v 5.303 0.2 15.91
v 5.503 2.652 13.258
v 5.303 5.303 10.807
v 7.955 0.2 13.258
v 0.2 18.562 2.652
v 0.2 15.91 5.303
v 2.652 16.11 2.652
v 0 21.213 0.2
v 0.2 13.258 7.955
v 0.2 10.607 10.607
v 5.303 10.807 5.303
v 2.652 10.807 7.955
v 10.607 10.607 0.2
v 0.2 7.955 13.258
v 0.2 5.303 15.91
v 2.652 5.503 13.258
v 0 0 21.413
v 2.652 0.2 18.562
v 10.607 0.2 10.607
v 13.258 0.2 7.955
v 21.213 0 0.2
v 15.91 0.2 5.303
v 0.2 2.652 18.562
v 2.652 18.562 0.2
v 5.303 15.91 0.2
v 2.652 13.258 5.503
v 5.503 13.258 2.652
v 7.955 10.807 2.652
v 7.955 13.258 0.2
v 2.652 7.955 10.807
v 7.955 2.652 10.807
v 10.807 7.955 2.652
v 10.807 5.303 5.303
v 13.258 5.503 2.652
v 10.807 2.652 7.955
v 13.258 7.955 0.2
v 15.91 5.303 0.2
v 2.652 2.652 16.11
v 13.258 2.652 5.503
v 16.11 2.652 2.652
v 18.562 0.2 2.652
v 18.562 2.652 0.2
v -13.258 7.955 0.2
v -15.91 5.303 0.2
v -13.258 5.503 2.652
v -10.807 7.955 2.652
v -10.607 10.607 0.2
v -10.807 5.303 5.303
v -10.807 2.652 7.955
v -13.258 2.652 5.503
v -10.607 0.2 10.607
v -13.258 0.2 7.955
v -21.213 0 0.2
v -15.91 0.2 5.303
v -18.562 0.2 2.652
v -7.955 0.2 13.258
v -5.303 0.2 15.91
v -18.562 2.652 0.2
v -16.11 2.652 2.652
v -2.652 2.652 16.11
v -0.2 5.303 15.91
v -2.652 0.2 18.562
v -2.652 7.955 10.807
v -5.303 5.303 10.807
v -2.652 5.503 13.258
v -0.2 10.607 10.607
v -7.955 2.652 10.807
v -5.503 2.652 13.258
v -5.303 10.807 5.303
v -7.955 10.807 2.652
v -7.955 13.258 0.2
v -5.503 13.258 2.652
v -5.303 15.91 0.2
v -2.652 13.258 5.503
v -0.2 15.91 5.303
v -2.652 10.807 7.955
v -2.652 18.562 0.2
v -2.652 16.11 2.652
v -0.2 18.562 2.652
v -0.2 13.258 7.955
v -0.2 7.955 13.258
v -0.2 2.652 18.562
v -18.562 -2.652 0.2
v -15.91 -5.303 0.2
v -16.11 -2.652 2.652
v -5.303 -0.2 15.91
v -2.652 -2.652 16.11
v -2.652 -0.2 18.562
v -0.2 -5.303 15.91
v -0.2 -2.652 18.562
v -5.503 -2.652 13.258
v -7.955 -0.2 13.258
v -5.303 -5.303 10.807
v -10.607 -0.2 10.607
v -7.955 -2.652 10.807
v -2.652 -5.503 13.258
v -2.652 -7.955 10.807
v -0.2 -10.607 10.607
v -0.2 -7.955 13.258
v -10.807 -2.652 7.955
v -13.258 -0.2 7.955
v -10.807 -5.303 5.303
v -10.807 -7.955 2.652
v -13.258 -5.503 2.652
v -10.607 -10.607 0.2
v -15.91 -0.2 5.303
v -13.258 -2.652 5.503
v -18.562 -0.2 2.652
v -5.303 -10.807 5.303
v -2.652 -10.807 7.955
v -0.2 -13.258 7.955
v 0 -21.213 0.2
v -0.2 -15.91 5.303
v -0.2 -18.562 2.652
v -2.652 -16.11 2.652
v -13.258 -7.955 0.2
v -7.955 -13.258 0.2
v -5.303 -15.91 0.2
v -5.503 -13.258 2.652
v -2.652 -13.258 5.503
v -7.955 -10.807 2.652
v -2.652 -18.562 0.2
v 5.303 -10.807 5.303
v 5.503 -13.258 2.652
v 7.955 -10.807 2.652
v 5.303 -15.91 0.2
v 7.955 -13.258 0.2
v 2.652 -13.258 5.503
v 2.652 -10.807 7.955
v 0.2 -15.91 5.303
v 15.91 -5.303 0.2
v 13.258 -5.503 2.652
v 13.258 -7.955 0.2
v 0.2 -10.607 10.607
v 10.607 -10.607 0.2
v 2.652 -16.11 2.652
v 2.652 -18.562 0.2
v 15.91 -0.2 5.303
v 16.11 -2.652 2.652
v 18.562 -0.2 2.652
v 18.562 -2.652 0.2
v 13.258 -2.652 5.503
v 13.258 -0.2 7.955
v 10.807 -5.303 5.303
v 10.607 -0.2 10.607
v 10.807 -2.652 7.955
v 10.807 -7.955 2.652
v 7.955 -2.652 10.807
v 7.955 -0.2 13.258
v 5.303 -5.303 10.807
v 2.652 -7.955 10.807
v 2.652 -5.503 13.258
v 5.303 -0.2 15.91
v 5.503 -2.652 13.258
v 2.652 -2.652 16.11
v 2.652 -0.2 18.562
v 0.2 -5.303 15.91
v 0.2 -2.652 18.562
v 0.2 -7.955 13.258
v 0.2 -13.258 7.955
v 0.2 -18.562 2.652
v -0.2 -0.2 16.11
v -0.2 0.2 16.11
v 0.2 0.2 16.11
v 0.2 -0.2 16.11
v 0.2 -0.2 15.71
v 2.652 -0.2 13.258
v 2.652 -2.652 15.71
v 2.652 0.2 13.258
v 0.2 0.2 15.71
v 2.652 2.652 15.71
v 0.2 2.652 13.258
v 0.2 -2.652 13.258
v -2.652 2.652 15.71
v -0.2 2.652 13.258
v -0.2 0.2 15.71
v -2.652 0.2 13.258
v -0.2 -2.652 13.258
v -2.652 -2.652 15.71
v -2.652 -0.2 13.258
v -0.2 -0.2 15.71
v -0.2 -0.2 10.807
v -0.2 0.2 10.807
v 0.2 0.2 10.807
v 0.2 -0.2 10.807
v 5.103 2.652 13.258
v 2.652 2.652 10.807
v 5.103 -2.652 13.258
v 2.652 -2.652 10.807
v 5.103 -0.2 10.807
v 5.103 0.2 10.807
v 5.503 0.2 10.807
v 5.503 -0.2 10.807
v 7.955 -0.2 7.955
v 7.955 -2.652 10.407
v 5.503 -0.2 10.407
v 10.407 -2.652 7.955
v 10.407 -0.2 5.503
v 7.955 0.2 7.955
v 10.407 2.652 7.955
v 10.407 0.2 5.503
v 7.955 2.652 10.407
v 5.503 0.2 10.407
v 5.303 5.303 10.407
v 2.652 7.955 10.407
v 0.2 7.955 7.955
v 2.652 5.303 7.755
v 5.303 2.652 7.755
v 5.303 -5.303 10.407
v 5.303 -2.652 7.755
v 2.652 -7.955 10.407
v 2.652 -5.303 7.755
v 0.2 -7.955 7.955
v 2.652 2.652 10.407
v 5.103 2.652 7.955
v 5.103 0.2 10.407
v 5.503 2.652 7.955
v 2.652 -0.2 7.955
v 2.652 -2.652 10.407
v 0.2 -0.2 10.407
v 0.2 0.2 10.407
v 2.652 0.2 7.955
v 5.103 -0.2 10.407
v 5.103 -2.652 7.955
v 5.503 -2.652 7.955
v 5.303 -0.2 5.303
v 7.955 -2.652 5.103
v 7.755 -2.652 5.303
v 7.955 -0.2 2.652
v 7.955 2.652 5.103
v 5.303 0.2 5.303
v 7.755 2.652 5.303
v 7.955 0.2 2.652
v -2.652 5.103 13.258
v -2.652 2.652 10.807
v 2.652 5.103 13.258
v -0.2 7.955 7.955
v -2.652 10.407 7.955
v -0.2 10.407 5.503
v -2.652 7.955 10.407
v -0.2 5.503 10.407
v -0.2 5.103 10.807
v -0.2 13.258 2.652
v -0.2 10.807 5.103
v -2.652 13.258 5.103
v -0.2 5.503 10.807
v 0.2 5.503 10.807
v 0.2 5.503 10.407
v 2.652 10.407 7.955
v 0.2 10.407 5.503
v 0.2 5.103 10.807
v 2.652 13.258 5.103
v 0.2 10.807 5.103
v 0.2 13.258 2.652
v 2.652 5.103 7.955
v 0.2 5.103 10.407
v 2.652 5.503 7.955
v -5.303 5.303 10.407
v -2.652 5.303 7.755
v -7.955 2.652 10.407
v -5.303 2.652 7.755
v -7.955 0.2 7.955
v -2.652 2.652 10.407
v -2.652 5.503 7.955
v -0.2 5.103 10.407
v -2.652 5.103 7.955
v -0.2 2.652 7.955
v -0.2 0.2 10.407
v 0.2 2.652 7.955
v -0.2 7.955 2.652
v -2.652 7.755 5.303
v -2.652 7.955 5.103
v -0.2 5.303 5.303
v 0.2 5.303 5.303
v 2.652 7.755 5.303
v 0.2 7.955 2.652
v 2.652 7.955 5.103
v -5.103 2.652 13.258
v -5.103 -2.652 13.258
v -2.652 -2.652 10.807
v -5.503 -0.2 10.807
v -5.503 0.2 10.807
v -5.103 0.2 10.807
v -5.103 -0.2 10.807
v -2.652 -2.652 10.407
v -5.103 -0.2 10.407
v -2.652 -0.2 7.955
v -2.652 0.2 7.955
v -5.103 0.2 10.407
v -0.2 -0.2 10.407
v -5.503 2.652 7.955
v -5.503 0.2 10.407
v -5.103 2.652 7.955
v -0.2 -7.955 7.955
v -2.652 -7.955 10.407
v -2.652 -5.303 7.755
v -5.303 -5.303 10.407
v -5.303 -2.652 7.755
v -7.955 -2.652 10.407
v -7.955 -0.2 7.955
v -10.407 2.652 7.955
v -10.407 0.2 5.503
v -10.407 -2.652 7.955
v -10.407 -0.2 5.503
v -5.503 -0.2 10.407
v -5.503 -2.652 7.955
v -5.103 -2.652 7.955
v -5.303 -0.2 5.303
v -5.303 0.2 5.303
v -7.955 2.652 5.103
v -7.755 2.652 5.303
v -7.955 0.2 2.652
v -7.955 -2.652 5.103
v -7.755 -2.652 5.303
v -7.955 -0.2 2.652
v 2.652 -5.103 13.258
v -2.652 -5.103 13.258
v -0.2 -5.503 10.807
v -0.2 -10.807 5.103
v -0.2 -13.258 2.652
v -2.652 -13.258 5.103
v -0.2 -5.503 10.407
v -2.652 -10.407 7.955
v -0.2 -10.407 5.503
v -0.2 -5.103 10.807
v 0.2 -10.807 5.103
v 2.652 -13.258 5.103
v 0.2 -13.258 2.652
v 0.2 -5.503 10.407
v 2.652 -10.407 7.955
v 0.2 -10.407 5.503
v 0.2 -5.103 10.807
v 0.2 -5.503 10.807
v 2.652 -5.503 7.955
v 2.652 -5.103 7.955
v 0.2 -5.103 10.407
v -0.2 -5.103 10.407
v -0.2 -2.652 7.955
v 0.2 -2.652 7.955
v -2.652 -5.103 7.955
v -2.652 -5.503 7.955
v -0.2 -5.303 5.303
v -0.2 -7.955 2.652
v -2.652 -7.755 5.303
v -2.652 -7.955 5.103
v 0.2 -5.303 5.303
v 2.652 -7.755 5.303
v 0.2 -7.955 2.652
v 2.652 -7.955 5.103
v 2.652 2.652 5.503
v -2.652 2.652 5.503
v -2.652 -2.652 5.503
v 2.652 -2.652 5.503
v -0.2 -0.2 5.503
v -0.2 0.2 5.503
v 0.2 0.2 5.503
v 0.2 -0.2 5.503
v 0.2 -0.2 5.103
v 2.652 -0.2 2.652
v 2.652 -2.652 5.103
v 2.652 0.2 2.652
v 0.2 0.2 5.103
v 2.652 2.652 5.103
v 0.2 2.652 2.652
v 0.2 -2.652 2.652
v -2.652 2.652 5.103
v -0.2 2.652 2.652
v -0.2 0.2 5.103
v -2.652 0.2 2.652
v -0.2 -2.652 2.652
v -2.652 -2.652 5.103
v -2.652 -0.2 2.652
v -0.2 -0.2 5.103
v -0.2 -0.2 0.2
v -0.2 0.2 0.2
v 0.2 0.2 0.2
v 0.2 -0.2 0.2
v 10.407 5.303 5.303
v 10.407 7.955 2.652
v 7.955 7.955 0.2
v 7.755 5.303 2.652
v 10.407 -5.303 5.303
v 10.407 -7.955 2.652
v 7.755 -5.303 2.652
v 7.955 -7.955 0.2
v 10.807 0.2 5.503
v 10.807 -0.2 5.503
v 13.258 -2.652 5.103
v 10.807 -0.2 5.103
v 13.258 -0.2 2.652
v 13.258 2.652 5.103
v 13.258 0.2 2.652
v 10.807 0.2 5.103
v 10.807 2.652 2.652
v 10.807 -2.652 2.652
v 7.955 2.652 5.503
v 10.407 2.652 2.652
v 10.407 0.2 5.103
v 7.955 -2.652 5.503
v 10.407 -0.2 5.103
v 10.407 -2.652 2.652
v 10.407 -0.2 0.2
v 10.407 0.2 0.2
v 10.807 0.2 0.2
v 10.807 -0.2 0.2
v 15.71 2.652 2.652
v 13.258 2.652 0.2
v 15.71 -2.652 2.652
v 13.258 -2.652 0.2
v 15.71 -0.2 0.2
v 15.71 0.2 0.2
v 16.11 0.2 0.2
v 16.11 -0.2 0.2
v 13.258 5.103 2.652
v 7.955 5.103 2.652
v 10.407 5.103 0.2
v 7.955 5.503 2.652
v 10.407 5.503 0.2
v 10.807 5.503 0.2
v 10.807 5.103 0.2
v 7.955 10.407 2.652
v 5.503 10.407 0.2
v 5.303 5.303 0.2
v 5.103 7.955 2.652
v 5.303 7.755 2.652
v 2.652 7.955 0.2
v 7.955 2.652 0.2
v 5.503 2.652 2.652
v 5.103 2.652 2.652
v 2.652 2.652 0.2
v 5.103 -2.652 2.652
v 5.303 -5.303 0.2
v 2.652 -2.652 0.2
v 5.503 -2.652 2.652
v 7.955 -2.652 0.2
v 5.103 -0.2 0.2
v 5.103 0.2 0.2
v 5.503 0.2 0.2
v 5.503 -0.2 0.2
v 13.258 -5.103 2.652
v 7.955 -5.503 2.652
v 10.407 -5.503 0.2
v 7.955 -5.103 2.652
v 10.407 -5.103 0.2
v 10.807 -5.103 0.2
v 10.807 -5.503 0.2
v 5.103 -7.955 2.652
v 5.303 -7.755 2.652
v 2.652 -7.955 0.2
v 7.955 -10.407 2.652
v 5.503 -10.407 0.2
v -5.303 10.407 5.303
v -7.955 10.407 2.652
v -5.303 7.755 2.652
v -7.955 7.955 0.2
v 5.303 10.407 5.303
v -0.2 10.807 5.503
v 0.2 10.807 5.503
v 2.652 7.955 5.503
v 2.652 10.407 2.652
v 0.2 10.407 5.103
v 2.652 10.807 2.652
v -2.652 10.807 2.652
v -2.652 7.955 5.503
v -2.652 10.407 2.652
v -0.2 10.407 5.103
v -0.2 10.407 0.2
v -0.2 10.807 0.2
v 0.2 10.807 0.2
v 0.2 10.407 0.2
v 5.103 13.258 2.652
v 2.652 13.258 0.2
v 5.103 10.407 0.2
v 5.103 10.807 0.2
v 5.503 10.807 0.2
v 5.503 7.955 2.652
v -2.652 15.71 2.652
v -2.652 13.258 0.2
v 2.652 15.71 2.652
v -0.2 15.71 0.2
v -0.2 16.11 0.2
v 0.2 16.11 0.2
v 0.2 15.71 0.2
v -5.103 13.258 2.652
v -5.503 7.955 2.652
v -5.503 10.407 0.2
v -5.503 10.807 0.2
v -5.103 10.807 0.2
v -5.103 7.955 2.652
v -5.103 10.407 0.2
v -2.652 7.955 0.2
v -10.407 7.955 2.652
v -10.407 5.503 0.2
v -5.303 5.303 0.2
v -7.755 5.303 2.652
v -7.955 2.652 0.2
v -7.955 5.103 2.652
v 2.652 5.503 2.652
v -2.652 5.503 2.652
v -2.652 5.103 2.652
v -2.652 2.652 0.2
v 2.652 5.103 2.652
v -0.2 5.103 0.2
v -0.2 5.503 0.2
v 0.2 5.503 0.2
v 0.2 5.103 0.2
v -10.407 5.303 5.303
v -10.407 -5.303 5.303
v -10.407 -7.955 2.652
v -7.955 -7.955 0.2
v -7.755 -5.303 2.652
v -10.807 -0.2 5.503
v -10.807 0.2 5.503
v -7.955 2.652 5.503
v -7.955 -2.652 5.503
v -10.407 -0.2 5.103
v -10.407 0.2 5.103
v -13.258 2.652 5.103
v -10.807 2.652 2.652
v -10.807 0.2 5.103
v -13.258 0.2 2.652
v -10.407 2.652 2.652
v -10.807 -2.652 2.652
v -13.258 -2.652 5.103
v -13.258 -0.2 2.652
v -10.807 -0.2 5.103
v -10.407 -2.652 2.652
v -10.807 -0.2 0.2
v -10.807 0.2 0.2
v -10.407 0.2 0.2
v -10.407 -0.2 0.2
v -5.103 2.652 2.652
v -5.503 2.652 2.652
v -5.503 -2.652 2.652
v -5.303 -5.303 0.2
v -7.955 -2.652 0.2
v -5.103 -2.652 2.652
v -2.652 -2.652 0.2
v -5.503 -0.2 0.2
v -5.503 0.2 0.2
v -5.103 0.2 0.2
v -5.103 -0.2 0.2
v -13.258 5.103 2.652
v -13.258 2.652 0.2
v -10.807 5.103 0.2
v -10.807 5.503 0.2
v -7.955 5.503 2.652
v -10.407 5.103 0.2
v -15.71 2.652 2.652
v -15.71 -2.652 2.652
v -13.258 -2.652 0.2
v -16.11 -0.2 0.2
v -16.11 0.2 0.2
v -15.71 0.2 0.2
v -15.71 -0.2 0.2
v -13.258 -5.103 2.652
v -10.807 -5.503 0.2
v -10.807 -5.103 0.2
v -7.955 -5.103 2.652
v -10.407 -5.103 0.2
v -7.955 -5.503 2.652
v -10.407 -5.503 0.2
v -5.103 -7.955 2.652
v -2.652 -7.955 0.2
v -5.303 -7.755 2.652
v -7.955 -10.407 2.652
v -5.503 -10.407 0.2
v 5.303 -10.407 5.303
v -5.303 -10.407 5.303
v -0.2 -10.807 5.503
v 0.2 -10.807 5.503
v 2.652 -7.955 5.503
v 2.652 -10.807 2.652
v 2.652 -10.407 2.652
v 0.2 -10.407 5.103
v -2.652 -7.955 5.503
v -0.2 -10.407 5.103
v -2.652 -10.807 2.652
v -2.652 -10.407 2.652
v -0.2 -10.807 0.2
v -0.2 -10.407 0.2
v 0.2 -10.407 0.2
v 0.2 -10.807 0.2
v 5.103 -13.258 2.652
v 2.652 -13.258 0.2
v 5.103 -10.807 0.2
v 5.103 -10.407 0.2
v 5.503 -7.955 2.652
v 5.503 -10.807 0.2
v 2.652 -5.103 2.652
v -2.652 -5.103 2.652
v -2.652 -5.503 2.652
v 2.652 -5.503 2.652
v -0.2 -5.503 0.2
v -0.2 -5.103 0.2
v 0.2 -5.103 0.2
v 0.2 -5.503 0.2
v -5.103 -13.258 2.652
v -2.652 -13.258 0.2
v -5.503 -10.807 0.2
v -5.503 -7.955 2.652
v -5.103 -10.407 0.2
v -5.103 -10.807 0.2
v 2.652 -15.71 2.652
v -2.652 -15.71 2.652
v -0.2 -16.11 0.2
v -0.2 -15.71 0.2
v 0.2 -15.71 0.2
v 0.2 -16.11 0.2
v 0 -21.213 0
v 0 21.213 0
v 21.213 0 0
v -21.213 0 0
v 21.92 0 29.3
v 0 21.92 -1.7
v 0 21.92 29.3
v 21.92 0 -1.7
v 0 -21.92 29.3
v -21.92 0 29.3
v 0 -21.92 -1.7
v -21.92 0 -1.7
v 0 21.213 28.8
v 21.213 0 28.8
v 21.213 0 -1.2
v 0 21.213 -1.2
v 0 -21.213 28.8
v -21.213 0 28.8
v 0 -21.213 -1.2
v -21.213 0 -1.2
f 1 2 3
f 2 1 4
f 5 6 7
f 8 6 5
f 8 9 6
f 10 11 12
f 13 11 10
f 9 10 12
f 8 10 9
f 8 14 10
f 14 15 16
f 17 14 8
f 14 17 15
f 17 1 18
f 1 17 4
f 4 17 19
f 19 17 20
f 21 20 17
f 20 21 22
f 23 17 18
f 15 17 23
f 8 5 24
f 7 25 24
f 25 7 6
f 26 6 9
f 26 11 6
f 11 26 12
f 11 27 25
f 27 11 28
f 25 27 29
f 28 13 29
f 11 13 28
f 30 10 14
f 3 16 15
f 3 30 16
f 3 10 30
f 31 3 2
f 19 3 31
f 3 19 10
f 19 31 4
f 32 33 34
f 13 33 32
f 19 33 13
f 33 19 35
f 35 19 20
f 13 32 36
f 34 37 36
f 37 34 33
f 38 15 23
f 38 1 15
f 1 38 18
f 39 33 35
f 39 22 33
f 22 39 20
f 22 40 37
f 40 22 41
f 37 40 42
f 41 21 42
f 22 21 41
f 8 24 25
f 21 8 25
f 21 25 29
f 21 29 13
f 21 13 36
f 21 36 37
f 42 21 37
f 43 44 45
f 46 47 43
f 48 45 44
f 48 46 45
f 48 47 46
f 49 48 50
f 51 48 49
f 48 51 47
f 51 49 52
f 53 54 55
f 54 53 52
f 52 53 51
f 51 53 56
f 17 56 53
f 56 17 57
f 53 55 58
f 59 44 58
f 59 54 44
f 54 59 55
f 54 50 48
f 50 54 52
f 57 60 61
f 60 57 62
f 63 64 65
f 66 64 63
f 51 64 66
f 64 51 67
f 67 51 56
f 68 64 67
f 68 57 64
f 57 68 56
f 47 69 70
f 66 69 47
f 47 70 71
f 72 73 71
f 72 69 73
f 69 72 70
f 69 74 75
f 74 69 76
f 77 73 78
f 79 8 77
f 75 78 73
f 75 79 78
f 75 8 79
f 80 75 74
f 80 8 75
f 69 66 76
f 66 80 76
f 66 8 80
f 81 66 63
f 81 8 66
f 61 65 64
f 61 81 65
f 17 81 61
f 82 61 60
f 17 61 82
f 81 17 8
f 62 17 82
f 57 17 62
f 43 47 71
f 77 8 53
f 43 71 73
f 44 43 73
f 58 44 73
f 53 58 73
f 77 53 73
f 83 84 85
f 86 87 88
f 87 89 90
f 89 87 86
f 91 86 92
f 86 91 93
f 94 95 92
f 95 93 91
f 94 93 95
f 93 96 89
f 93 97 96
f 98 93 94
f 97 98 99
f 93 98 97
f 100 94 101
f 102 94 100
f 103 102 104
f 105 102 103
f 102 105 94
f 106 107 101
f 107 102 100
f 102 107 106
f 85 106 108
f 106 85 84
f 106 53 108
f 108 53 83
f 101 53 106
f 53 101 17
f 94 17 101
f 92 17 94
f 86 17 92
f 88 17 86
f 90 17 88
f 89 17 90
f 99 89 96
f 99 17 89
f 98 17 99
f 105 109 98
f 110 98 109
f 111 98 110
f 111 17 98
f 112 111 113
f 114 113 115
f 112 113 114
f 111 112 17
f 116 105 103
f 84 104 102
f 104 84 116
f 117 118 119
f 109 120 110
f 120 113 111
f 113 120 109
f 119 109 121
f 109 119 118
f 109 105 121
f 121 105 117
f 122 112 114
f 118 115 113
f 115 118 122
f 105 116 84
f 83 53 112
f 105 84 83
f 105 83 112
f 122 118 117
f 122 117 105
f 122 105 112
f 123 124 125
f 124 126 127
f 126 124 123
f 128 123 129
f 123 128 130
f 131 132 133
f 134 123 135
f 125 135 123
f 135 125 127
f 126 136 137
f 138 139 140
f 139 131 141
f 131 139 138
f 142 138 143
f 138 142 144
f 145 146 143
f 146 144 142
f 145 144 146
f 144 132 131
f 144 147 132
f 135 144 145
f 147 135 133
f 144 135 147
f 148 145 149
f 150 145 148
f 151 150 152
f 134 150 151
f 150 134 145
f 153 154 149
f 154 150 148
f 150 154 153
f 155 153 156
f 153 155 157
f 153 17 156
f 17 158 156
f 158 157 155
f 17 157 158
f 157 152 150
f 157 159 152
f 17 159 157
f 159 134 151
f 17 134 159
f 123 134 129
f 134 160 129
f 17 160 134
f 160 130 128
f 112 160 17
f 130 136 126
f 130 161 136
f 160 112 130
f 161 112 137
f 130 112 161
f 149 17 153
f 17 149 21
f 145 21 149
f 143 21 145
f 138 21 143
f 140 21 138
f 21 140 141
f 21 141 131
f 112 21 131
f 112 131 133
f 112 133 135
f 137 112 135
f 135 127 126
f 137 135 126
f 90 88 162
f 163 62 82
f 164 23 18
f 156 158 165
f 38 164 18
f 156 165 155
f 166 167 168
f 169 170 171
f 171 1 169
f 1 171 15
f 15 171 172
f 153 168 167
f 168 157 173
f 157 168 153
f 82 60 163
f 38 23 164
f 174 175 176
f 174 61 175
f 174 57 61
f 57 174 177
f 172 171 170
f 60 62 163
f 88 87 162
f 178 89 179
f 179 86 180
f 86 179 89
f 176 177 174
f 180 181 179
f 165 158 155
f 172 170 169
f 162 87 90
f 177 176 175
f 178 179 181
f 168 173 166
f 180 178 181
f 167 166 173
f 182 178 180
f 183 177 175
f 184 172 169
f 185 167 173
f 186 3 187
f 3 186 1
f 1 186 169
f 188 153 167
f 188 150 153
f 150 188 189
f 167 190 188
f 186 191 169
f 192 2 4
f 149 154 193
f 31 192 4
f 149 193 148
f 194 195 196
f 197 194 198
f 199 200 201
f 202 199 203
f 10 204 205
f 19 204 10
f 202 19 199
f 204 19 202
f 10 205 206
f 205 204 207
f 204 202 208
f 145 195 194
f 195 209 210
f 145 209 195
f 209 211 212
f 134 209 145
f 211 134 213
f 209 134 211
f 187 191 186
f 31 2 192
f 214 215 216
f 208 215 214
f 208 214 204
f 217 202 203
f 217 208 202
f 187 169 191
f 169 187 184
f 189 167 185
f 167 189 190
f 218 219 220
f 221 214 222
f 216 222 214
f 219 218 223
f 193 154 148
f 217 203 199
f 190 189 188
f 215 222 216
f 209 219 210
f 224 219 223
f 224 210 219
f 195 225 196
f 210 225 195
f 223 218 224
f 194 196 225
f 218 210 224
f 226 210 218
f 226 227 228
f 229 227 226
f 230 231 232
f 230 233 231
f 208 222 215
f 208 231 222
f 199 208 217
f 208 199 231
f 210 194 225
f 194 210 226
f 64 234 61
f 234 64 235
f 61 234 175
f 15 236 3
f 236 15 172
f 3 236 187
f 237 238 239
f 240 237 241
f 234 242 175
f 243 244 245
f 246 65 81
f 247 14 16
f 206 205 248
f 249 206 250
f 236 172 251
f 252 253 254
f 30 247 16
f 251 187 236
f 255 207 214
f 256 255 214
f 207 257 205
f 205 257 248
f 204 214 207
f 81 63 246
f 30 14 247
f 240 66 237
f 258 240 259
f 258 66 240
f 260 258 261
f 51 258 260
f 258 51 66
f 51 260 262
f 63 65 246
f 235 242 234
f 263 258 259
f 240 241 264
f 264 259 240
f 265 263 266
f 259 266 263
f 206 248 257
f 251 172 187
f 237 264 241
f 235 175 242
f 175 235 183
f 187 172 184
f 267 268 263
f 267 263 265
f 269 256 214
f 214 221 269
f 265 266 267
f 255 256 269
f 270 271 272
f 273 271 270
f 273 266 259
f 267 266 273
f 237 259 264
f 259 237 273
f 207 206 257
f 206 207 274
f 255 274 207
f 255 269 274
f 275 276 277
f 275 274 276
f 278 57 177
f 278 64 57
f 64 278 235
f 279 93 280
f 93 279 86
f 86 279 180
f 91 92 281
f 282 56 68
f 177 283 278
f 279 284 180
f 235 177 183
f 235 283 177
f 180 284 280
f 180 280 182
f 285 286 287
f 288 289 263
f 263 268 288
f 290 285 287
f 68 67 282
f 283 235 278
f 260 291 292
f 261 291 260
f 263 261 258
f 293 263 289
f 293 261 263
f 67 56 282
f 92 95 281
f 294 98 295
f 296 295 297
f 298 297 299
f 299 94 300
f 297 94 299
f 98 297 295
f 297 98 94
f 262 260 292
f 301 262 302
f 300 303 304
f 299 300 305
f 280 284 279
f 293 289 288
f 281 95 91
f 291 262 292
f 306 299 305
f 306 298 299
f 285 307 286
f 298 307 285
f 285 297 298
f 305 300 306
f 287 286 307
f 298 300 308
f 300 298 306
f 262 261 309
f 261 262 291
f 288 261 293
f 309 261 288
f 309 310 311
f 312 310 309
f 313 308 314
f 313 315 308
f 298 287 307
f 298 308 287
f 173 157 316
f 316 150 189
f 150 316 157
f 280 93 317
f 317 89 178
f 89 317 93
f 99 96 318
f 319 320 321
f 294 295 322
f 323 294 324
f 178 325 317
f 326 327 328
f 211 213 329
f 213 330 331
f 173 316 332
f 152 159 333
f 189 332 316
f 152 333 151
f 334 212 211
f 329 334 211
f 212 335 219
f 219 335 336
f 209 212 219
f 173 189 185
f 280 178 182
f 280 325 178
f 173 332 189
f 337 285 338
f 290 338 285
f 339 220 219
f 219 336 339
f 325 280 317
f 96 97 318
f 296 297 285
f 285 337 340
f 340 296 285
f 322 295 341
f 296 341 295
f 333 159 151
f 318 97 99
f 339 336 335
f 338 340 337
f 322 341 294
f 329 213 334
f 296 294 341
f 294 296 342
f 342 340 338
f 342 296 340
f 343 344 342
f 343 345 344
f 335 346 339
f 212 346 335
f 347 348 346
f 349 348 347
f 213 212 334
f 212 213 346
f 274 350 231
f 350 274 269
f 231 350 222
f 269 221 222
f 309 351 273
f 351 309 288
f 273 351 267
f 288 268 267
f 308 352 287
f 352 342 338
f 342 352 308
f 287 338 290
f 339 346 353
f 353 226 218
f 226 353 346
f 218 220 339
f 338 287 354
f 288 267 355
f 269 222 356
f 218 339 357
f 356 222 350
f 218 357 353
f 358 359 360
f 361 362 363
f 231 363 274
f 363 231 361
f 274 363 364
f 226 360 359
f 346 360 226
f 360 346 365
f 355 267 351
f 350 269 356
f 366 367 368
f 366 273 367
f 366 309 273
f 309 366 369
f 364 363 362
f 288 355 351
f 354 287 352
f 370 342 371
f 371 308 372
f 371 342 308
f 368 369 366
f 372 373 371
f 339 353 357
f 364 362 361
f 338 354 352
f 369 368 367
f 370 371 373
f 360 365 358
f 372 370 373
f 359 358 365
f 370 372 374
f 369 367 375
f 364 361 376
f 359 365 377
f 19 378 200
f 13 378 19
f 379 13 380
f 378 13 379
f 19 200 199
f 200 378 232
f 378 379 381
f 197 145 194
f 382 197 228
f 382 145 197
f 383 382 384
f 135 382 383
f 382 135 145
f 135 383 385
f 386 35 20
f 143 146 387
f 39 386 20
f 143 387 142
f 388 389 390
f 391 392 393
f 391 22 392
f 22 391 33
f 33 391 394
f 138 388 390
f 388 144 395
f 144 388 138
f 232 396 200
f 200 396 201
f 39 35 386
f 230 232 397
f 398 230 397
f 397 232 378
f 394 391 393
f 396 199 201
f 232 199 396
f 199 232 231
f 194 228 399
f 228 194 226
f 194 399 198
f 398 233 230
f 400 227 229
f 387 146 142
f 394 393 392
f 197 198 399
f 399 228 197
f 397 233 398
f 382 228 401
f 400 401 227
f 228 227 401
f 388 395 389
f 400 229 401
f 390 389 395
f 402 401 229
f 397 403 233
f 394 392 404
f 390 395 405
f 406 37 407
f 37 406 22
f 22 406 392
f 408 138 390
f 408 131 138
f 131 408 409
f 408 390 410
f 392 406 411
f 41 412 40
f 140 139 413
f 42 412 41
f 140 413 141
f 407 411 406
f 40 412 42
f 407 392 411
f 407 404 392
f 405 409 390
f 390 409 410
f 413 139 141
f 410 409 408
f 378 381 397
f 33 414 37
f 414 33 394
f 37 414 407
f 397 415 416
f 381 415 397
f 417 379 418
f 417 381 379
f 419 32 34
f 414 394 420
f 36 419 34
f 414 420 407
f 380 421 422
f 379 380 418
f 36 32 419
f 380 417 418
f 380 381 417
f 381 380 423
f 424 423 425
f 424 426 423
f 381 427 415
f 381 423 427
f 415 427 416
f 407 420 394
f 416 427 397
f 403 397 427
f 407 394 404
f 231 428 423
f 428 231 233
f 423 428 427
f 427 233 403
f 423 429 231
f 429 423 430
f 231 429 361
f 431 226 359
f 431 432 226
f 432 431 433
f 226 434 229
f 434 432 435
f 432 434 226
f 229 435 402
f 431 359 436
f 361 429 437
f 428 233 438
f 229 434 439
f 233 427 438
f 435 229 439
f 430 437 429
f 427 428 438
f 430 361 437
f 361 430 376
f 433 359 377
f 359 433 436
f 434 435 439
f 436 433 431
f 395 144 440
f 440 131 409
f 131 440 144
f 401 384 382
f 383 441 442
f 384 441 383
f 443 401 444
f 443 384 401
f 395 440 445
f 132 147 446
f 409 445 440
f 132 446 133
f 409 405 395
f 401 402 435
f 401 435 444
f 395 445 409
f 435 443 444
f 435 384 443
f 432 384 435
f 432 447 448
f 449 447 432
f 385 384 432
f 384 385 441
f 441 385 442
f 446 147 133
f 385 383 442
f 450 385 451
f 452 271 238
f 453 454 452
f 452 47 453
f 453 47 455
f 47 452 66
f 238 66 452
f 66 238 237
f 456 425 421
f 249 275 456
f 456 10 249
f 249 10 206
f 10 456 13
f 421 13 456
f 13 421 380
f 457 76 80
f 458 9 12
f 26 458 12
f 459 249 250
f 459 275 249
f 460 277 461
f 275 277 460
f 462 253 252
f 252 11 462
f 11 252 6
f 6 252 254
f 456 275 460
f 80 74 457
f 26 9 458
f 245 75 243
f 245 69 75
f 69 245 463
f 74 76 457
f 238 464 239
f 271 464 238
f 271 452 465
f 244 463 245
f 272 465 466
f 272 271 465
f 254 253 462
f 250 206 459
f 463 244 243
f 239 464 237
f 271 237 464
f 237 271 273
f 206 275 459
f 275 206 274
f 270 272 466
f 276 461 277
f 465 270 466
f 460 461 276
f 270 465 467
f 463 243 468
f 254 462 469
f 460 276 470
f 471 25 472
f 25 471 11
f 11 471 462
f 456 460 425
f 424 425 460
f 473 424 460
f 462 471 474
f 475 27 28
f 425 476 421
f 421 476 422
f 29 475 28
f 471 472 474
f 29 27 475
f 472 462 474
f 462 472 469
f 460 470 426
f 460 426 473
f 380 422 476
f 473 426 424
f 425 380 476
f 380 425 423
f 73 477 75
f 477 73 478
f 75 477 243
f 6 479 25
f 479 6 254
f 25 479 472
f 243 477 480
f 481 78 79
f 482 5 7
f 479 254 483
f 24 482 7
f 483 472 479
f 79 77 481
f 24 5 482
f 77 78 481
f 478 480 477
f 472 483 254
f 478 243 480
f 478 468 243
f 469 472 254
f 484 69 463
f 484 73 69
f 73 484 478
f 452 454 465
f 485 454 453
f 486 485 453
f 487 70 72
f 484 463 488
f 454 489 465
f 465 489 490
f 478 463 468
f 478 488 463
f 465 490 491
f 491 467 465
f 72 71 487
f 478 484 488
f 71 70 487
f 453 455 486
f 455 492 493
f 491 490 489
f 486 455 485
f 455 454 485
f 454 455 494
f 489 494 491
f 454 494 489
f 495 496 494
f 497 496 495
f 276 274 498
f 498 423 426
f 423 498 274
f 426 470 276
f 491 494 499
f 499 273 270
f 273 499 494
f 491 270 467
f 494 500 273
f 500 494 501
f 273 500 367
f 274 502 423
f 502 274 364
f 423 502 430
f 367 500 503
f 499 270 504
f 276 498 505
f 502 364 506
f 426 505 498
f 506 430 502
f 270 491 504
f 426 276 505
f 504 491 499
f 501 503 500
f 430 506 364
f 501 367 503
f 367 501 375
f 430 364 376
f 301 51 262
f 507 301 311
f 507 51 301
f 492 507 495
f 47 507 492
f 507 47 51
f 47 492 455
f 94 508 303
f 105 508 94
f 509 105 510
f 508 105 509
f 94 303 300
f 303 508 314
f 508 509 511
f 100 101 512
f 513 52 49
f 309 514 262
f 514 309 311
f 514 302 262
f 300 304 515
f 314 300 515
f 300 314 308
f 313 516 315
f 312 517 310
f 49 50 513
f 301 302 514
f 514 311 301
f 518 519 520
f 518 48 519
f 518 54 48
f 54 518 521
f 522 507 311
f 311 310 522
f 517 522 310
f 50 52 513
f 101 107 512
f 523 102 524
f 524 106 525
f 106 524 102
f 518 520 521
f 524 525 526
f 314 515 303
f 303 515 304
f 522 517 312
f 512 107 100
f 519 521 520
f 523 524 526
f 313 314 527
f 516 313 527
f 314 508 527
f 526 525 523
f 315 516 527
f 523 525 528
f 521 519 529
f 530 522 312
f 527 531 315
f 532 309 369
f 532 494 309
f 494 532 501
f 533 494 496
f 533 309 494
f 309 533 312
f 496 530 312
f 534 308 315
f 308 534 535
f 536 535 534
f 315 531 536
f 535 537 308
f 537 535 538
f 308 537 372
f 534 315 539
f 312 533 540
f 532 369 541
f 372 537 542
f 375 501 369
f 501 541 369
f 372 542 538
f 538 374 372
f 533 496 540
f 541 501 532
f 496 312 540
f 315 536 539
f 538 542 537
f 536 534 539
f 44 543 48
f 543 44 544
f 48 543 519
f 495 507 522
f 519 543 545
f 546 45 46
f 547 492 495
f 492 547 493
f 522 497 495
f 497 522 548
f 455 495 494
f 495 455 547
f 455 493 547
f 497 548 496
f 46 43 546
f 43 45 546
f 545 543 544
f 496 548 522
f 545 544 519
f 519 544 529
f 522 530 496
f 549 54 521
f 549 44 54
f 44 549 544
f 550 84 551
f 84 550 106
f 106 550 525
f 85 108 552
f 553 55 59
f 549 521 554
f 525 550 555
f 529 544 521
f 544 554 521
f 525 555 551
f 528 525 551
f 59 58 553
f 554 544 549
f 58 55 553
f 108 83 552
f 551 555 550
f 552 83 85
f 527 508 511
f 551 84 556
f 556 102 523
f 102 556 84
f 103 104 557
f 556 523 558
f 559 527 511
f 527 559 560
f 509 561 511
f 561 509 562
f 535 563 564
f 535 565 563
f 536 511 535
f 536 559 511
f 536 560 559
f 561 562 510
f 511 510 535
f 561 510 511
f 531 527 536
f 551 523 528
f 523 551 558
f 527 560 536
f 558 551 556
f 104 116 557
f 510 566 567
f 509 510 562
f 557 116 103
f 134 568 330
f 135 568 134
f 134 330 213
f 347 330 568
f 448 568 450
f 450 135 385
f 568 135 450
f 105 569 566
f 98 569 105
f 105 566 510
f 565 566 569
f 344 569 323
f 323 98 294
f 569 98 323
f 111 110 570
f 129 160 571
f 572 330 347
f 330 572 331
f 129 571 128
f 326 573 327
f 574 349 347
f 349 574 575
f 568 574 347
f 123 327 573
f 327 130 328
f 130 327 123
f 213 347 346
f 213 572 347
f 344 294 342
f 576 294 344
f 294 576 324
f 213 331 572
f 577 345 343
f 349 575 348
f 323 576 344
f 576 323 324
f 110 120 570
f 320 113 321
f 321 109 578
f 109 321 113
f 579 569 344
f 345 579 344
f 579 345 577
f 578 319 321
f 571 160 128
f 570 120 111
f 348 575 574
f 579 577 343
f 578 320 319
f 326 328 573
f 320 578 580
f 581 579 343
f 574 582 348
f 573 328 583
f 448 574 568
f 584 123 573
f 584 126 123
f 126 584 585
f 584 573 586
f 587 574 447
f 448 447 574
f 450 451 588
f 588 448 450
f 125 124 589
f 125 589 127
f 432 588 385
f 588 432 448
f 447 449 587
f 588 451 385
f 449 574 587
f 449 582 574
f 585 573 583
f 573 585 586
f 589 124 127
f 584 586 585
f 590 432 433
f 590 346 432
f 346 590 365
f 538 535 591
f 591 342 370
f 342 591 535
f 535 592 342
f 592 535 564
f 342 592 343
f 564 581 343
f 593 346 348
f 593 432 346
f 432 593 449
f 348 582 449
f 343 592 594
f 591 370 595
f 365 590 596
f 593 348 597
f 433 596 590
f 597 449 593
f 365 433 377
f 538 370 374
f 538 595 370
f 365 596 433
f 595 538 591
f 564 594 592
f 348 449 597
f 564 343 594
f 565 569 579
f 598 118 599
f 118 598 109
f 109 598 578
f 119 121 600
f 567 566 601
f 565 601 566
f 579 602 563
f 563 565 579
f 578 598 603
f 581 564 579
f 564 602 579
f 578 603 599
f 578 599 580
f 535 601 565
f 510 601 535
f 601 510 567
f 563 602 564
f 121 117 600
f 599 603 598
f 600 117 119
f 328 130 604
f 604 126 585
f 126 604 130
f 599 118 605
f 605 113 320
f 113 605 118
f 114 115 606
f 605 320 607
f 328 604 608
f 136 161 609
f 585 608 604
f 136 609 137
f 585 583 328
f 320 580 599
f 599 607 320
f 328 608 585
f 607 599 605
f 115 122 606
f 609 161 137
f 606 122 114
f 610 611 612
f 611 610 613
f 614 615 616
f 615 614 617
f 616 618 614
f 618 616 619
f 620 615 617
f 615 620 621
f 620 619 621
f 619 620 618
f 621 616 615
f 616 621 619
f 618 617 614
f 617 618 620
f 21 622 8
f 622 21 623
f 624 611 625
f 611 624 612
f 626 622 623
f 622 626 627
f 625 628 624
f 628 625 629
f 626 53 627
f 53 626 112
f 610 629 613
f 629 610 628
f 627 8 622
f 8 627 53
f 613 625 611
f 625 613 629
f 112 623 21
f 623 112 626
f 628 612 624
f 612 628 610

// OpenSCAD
//base size
size = 30;

/*[Hidden]*/

x = 0;
thicken = .20;
fdepth = 3;
size0 = size / sqrt(2);

module octa(depth, vec, sz) {
    cx = vec[0];
    cy = vec[1];
    cz = vec[2];
    if (depth == fdepth) {
        szc = sz + thicken;
        polyhedron(points = [
            [cx      , cy      , cz + szc],
            [cx + szc, cy      , cz      ],
            [cx      , cy + szc, cz      ],
            [cx - szc, cy      , cz      ],
            [cx      , cy - szc, cz      ],
            [cx      , cy      , cz - szc]],
           faces = [[0, 1, 2], [0, 2, 3], [0, 3, 4], [0, 4, 1],
                    [5, 4, 3], [5, 3, 2], [5, 2, 1], [5, 1, 4]],
            convexity = 2);
    } else {
       octa(depth + 1, [cx         , cy         , cz + sz / 2], sz / 2);
       octa(depth + 1, [cx + sz / 2, cy         , cz         ], sz / 2);
       octa(depth + 1, [cx         , cy + sz / 2, cz         ], sz / 2);
       octa(depth + 1, [cx - sz / 2, cy         , cz         ], sz / 2);
       octa(depth + 1, [cx         , cy - sz / 2, cz         ], sz / 2);
       octa(depth + 1, [cx         , cy         , cz - sz / 2], sz / 2);
    }
}
module cutout_cube(){
    translate([0, 0, -5000]){
    cube([10000, 10000, 10000], center=true);
}
}

    echo("pyramid");
    difference(){
    octa(x, [0, 0, 0], size0);
        
    cutout_cube();
    }

  

rotate([0, 0, 45]){
  translate([0, 0, (size / 2 - 1.2)]){
    difference() {
      cube([(size + 1), (size + 1), (size + 1)], center=true);

      cube([(size + 0), (size + 0), (size + 0)], center=true);
    }
  }
}
// remixed from a design by  taroh
